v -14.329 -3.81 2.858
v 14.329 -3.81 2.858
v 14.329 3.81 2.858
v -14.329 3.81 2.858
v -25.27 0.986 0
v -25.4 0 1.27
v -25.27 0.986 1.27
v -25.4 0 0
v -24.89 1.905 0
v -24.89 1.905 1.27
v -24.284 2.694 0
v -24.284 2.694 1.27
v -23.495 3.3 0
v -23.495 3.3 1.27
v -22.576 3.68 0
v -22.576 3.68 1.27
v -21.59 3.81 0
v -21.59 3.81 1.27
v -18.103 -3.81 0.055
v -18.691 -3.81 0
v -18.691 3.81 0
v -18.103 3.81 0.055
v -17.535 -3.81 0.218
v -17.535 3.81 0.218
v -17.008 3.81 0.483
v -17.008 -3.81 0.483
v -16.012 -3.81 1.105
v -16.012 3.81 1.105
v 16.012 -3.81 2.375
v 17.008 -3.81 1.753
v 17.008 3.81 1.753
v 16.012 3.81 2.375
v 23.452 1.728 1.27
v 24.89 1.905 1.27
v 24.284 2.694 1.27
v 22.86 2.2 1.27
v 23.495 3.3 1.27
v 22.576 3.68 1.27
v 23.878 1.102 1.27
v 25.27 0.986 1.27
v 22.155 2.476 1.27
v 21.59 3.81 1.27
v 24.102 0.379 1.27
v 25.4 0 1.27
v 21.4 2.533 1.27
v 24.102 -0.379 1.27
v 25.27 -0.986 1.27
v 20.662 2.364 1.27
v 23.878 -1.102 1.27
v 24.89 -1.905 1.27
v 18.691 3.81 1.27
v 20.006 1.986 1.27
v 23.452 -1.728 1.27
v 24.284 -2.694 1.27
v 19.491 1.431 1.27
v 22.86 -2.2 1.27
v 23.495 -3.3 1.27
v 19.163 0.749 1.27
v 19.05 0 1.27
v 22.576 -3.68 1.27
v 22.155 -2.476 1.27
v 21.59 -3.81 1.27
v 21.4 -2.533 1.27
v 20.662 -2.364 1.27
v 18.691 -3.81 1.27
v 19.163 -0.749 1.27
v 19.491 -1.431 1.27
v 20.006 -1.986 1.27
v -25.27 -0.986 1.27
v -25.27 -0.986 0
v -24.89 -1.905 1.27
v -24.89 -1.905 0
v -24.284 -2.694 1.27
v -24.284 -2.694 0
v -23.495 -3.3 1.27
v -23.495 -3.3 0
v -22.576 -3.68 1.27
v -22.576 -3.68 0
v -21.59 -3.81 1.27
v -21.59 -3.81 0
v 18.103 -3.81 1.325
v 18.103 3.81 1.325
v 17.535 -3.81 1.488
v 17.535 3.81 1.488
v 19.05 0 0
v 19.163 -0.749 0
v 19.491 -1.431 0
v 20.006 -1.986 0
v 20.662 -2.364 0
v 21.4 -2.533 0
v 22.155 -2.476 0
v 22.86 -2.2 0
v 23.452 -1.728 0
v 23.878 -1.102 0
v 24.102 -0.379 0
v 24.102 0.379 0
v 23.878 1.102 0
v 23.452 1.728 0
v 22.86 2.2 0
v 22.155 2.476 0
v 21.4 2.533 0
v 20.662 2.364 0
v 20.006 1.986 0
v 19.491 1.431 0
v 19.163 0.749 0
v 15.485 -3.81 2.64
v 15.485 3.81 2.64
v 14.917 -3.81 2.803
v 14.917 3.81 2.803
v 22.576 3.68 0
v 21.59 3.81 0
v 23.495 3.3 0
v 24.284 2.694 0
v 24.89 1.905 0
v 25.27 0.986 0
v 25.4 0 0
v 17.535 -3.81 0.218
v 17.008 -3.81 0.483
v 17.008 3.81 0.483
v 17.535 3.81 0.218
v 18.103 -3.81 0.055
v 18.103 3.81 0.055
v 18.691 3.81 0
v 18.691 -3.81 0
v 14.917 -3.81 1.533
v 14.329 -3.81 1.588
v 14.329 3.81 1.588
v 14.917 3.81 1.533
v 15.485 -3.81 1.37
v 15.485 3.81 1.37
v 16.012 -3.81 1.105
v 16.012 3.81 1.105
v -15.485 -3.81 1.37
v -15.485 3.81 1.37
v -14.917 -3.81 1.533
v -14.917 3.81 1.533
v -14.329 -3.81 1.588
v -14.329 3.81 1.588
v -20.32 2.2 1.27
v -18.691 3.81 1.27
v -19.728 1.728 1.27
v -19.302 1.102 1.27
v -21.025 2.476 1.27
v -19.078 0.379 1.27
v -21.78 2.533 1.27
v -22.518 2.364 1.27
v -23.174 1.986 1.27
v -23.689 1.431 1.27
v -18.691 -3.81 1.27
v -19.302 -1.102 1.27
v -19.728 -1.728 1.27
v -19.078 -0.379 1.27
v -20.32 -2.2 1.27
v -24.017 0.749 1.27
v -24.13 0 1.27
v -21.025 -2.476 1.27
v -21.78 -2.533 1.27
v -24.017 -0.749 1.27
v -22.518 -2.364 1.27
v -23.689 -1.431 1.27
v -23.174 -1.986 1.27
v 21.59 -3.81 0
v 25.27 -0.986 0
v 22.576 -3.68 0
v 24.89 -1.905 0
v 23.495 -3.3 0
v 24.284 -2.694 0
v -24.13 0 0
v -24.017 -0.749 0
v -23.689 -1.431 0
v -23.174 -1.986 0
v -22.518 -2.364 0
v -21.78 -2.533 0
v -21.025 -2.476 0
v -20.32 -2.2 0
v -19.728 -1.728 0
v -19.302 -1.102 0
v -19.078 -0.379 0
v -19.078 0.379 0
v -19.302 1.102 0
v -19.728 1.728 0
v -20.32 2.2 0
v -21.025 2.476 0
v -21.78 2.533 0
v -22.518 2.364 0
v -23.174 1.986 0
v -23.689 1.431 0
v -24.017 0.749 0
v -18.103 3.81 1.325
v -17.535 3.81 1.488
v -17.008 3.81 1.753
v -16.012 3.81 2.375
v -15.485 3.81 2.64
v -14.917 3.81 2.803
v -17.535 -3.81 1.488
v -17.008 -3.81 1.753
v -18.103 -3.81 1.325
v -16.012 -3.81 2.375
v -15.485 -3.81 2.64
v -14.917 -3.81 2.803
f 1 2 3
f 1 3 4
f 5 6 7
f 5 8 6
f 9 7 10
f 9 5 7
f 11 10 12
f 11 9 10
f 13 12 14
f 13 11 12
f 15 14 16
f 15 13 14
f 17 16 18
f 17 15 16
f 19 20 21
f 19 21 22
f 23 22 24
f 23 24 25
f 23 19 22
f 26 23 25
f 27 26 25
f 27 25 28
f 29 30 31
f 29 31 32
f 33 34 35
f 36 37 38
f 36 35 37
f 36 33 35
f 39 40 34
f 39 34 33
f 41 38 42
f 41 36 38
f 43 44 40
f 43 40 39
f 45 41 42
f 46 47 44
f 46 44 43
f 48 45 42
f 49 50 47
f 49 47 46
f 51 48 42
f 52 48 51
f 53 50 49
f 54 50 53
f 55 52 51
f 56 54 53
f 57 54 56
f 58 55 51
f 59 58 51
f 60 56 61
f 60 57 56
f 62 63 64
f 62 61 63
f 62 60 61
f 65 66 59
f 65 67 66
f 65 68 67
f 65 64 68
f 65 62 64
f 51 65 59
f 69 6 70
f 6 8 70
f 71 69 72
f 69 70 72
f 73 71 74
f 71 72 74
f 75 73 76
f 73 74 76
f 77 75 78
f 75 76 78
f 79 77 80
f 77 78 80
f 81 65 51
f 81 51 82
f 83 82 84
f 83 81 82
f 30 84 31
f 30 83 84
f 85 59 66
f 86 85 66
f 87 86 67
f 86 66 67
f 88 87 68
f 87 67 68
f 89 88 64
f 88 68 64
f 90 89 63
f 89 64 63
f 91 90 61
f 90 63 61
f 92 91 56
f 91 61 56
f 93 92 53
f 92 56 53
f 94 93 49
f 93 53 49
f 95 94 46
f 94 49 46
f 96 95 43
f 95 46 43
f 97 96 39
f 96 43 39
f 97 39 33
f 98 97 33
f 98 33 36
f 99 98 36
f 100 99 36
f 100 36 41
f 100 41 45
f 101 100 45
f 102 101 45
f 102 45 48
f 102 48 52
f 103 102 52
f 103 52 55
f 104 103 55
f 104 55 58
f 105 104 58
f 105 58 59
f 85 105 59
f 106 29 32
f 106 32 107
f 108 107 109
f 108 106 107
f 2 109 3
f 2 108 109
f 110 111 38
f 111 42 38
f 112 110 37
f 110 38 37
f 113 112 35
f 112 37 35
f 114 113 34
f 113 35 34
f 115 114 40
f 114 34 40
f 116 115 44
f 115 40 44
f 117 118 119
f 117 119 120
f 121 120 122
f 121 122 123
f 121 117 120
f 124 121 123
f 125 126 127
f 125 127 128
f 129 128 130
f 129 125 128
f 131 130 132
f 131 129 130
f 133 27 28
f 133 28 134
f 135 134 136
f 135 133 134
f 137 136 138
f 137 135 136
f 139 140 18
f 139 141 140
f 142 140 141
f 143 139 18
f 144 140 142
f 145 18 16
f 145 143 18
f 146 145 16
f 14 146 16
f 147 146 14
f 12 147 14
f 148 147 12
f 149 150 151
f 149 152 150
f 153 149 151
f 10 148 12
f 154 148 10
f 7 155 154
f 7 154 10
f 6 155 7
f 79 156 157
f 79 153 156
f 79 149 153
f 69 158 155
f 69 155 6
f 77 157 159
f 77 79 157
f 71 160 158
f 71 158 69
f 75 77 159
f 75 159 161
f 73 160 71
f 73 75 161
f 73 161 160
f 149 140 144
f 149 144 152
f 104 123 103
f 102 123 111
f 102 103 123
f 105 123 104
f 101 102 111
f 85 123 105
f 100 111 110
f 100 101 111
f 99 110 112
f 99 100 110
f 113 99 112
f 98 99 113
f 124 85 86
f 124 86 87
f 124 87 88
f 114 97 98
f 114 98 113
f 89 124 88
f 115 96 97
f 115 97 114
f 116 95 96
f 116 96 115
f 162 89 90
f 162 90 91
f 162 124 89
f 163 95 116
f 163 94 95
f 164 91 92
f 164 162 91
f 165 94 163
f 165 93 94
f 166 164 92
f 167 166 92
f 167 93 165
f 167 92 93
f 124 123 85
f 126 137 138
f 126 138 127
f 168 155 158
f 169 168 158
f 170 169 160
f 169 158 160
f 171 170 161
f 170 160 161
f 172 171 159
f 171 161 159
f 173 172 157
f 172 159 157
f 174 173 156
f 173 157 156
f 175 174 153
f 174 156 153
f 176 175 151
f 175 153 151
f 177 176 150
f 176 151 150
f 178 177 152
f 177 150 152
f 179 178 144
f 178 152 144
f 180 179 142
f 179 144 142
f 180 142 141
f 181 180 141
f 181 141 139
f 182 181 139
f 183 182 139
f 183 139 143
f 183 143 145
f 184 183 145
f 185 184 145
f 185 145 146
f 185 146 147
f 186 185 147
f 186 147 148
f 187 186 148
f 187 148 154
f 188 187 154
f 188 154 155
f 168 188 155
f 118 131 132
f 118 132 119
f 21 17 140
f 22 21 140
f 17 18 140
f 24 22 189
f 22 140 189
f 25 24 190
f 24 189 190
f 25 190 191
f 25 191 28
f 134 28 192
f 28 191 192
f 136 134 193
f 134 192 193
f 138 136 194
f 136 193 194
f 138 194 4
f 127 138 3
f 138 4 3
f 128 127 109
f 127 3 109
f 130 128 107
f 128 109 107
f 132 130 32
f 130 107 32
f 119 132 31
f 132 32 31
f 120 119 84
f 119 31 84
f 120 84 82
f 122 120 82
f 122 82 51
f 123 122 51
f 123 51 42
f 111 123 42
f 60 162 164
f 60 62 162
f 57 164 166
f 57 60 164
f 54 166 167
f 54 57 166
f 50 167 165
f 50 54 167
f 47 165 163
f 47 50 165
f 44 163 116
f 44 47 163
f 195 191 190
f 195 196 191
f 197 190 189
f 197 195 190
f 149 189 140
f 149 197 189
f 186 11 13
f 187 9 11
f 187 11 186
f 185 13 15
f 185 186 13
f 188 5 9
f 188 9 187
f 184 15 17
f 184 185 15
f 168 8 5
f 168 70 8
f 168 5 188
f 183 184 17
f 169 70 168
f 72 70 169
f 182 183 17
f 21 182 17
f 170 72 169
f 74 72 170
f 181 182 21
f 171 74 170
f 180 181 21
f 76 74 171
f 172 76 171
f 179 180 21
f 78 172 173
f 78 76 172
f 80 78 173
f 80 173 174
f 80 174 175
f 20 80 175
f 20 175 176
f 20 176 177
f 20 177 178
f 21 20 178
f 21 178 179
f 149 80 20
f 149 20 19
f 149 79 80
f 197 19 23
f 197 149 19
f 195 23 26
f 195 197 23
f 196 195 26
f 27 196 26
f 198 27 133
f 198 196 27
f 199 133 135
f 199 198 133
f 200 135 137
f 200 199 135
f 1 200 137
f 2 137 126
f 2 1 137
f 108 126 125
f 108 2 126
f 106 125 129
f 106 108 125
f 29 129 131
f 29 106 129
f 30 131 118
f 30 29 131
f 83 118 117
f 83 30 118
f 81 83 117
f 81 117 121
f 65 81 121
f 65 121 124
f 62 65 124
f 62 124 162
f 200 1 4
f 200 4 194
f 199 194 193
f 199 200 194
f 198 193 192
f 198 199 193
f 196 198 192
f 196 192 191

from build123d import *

# Parameters (mm, degrees)
F2_DEPTH = 3.81
F3_D     = 5.08
F3_DEPTH = 3.81
F3_TIP   = 1.5261859723
F4_R     = 3.80999


# Not quite as in the source:
# - a fillet or chamfer is up to 0.001 mm smaller than in the source, because OpenCascade refuses the exact size


with BuildPart() as f2:
    # F1 (on Front) → F2 (new body, symmetric)
    with BuildSketch(Plane.XZ):
        with BuildLine():
            Line((-25.4, 1.27), (-25.4, 0))
            Line((-25.4, 0), (-18.6905780189, 0))
            ThreePointArc((-18.6905780189, 0), (-17.8152860399, 0.1230352309), (-17.0078313843, 0.4826053848))
            Line((-17.0078313843, 0.4826053848), (-16.0121686157, 1.1048946152))
            ThreePointArc((-16.0121686157, 1.1048946152), (-15.2047139601, 1.4644647691), (-14.3294219811, 1.5875))
            Line((-14.3294219811, 1.5875), (14.3294219811, 1.5875))
            ThreePointArc((14.3294219811, 1.5875), (15.2047139601, 1.4644647691), (16.0121686157, 1.1048946152))
            Line((16.0121686157, 1.1048946152), (17.0078313843, 0.4826053848))
            ThreePointArc((17.0078313843, 0.4826053848), (17.8152860399, 0.1230352309), (18.6905780189, 0))
            Line((18.6905780189, 0), (25.4, 0))
            Line((25.4, 0), (25.4, 1.27))
            Line((25.4, 1.27), (18.6905780189, 1.27))
            ThreePointArc((18.6905780189, 1.27), (17.8152860399, 1.3930352309), (17.0078313843, 1.7526053848))
            Line((17.0078313843, 1.7526053848), (16.0121686157, 2.3748946152))
            ThreePointArc((16.0121686157, 2.3748946152), (15.2047139601, 2.7344647691), (14.3294219811, 2.8575))
            Line((14.3294219811, 2.8575), (-14.3294219811, 2.8575))
            ThreePointArc((-14.3294219811, 2.8575), (-15.2047139601, 2.7344647691), (-16.0121686157, 2.3748946152))
            Line((-16.0121686157, 2.3748946152), (-17.0078313843, 1.7526053848))
            ThreePointArc((-17.0078313843, 1.7526053848), (-17.8152860399, 1.3930352309), (-18.6905780189, 1.27))
            Line((-18.6905780189, 1.27), (-25.4, 1.27))
        make_face()
    extrude(amount=F2_DEPTH, both=True)

    # F3
    with Locations(Plane(origin=(0, 0, 0), x_dir=(1, 0, 0), z_dir=(0, 0, -1))):
        with Locations((-21.59, 0), (21.59, 0)):
            Hole(F3_D / 2, depth=F3_DEPTH)
            with Locations((0, 0, -(F3_DEPTH + F3_TIP / 2))):  # 118° drill point
                Cone(0, F3_D / 2, F3_TIP, mode=Mode.SUBTRACT)

    # F4 (radius 3.81 in the source; OpenCascade refuses exactly that, so slightly less here)
    f4_edges = [f2.edges().sort_by_distance(p)[0] for p in [
        (-25.4, -3.81, 0.635),
        (-25.4, 3.81, 0.635),
        (25.4, -3.81, 0.635),
        (25.4, 3.81, 0.635),
    ]]
    fillet(f4_edges, radius=F4_R)


solid = f2.part
